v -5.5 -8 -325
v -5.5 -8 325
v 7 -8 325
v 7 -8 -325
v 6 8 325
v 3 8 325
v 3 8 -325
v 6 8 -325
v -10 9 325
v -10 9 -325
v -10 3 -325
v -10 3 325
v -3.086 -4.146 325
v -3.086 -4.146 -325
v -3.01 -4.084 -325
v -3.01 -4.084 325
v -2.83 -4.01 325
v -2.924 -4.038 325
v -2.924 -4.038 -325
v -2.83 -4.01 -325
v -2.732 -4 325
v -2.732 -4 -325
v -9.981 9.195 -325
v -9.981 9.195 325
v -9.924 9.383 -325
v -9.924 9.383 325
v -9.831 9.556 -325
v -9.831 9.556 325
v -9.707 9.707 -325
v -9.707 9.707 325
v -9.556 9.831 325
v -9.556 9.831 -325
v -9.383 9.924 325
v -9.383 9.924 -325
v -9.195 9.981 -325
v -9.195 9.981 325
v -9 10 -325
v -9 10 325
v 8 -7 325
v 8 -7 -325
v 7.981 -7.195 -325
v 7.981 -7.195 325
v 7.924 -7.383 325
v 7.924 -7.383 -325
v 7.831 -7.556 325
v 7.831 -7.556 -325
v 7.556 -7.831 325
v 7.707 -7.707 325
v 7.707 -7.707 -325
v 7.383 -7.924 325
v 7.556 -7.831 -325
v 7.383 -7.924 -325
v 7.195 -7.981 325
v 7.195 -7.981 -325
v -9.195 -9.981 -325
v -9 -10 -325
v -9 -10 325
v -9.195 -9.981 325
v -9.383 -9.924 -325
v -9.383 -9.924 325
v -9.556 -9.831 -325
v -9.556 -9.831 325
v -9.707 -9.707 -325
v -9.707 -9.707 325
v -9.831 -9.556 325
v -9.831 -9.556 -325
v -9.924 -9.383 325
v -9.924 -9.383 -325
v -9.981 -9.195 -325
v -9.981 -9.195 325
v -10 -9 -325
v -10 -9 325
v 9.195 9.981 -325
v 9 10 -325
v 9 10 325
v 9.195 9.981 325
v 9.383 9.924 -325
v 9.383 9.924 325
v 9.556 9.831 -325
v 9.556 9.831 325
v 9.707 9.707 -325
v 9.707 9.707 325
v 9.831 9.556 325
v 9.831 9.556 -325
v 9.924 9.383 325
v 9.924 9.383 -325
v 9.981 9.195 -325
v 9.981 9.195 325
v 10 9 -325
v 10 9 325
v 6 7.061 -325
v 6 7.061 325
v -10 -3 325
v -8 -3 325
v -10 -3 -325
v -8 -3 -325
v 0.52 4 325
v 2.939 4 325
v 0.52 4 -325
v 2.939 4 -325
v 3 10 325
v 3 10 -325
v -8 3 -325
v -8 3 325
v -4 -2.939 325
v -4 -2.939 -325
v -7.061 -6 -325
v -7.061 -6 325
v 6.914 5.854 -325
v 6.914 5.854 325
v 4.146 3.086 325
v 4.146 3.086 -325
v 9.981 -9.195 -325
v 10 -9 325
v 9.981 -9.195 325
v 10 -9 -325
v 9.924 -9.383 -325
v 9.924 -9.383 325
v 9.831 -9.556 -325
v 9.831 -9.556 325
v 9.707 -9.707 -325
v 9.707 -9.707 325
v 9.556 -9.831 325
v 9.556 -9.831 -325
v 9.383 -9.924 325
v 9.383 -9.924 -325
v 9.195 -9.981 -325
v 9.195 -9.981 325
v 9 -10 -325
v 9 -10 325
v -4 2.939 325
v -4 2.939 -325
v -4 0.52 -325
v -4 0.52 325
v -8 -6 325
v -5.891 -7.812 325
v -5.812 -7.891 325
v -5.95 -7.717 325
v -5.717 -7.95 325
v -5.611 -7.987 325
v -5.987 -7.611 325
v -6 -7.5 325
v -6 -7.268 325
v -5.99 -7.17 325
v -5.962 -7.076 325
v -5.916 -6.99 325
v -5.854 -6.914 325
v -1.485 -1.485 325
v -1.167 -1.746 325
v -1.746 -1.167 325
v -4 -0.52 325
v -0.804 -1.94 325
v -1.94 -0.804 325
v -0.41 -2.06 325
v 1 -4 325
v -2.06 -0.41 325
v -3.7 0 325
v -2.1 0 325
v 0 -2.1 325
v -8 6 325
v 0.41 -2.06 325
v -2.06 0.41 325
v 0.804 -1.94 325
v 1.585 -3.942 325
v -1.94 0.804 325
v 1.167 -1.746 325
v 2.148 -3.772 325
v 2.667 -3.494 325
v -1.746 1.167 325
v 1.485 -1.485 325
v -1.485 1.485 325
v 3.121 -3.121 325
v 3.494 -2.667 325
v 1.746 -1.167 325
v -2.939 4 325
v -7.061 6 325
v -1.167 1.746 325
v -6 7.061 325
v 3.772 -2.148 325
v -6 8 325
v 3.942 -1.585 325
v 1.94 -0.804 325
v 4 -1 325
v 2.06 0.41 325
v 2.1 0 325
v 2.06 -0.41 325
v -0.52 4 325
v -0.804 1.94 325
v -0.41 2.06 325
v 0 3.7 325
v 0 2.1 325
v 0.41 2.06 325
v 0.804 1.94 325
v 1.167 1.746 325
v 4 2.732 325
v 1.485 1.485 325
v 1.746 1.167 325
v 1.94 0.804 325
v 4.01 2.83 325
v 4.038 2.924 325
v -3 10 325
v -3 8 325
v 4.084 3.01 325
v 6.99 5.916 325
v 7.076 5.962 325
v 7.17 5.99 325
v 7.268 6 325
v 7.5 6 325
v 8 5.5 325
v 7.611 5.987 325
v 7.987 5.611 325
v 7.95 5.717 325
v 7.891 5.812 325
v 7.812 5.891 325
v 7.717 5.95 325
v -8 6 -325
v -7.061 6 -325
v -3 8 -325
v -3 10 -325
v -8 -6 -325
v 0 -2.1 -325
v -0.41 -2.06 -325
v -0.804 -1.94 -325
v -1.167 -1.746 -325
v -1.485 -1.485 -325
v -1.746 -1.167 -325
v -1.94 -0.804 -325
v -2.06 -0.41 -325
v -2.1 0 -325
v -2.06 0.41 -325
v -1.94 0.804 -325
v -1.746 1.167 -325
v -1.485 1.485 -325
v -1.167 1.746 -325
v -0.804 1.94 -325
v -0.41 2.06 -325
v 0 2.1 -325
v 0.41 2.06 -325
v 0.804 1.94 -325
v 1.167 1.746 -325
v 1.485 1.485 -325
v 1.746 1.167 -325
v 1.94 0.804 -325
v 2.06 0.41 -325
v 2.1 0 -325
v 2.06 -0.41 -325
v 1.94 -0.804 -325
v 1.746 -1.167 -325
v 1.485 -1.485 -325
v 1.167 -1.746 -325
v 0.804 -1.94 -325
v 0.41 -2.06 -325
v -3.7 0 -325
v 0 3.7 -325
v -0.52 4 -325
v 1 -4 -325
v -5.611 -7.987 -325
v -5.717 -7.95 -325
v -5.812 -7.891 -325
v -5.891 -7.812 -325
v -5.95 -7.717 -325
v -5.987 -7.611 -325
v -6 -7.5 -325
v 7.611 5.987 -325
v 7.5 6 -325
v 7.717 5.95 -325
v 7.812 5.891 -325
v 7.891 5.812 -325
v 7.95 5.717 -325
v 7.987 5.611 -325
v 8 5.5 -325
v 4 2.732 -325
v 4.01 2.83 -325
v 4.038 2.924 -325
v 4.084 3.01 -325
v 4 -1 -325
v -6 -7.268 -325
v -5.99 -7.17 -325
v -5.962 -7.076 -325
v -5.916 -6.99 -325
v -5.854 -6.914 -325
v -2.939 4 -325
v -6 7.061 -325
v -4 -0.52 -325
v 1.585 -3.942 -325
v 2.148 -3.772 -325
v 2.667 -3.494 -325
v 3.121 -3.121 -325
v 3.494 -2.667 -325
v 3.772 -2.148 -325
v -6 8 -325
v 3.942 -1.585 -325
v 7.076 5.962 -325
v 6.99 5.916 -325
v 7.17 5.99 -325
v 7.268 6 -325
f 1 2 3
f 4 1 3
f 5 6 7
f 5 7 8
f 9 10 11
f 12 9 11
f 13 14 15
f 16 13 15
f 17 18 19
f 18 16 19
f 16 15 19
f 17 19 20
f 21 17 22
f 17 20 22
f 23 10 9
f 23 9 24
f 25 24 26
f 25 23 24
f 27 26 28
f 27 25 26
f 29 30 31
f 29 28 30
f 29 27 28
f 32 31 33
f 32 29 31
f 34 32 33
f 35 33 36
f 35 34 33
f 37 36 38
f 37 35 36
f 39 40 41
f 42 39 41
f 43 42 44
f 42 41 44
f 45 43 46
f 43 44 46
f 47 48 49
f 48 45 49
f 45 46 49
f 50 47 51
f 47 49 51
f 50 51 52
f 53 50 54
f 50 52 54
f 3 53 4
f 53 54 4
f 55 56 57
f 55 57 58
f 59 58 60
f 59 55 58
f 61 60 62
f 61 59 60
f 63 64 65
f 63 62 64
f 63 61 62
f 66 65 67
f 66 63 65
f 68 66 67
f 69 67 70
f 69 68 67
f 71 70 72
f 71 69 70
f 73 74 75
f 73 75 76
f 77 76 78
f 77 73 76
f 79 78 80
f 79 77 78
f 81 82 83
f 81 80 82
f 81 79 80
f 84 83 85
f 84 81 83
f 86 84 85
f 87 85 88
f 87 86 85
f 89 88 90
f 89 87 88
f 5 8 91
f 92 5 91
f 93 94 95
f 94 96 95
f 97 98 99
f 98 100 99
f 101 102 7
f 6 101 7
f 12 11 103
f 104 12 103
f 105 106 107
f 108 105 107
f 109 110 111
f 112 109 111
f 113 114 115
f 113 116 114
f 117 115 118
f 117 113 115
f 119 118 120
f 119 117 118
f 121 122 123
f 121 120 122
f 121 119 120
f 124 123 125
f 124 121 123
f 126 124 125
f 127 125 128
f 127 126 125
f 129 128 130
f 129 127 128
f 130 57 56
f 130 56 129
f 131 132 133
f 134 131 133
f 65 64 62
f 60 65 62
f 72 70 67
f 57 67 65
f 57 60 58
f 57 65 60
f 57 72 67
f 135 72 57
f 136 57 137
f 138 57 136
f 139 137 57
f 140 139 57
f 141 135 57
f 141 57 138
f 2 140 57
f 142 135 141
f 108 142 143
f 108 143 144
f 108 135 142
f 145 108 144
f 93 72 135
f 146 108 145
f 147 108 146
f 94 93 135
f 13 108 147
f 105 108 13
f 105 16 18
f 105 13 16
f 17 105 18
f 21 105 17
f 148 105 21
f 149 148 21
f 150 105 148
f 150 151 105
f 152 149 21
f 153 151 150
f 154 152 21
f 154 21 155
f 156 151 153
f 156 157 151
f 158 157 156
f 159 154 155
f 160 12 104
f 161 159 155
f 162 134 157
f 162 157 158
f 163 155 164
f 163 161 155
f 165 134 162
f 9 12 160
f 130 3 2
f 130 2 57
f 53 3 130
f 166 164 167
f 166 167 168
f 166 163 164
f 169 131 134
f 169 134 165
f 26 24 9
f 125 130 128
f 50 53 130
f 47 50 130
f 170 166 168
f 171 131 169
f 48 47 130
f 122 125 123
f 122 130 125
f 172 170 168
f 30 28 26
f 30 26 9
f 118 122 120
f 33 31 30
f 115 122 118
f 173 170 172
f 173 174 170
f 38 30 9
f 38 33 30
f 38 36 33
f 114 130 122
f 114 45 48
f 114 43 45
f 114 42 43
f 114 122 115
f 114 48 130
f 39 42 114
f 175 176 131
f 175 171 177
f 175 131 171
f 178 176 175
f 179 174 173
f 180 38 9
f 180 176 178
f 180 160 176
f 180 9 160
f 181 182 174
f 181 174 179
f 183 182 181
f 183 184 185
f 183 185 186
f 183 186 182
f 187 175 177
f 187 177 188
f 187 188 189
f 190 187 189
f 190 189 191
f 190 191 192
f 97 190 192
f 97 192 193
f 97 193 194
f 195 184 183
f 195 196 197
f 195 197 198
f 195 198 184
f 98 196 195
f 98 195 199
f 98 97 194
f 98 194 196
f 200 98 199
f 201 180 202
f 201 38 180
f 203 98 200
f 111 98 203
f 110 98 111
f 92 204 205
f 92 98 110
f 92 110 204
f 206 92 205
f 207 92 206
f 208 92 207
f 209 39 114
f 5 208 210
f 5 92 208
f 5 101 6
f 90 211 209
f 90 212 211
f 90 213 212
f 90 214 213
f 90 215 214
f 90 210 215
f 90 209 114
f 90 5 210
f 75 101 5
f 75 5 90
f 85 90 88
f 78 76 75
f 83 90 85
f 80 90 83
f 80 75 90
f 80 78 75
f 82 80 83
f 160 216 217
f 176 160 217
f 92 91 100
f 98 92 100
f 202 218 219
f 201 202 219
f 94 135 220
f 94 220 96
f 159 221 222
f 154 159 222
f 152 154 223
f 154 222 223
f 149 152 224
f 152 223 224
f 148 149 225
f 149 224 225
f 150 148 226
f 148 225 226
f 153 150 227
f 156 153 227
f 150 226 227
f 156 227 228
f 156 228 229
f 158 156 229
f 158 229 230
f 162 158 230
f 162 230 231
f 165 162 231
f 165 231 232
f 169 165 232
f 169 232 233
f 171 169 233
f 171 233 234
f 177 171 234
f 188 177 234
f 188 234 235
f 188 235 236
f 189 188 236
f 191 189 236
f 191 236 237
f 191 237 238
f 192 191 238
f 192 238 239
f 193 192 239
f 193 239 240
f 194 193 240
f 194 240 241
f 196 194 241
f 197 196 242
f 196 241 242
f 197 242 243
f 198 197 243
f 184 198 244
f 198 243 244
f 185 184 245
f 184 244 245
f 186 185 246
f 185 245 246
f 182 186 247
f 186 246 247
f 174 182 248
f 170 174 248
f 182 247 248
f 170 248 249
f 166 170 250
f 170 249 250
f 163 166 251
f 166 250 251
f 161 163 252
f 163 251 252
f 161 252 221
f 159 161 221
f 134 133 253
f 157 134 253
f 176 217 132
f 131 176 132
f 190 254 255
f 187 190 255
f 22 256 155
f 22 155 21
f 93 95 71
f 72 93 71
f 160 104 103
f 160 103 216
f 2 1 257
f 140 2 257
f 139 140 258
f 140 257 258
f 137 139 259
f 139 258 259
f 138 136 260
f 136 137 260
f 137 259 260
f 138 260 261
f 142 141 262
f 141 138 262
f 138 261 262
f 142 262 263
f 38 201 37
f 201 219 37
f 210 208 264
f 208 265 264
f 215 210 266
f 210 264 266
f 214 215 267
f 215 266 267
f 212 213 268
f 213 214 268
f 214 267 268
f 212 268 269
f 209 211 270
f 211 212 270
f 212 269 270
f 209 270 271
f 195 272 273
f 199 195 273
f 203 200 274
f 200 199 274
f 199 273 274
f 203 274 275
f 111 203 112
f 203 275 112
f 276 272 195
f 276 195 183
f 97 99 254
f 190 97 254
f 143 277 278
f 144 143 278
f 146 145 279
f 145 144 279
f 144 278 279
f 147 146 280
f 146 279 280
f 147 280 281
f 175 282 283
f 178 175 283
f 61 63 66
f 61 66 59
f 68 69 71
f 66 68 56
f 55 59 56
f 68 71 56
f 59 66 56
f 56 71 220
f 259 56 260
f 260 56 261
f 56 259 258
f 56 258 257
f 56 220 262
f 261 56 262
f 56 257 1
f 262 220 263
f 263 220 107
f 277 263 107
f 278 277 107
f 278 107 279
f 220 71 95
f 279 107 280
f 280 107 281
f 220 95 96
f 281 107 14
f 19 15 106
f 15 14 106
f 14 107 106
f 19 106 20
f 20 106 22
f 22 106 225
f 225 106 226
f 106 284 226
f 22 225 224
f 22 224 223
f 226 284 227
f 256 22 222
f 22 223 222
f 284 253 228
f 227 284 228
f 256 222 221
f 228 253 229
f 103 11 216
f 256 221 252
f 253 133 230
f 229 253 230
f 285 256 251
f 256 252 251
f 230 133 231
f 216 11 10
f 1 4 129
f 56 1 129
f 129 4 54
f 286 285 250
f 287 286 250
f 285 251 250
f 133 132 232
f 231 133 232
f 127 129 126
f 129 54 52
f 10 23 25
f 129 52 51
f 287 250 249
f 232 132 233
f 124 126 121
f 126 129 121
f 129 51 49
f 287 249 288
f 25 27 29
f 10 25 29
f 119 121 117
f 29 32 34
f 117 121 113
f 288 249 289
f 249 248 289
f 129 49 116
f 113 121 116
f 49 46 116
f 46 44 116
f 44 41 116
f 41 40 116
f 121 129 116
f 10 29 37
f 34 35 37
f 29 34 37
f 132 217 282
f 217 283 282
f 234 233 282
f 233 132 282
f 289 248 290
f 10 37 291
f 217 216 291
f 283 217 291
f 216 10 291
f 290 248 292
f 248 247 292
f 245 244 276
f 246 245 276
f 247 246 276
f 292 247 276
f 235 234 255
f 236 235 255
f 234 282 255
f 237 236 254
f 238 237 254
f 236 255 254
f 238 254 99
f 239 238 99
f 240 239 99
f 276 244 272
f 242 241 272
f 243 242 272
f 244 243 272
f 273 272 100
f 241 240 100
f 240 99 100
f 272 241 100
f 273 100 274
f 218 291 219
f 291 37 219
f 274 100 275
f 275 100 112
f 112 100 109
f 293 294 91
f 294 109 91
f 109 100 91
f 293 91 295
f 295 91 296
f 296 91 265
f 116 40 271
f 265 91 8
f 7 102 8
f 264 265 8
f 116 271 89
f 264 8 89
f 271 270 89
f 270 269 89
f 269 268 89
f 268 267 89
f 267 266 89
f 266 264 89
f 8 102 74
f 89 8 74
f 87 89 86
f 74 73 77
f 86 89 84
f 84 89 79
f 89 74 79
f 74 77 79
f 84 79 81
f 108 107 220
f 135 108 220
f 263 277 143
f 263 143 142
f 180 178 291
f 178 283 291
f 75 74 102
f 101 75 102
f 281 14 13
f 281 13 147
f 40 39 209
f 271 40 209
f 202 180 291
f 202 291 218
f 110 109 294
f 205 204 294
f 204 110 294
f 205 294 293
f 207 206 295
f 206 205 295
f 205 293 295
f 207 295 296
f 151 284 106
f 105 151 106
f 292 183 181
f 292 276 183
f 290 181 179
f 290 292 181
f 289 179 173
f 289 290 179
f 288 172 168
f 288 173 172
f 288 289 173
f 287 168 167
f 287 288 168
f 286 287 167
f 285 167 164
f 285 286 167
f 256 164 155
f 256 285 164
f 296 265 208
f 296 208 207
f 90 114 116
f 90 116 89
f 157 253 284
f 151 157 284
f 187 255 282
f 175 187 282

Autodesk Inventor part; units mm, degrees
sketch "Sketch_64" plane through (0, 0, 0) normal (0, 0, 1) x (1, 0, 0)
  line L0 (-10, -3) -> (-10, -9)
  arc A0 (-10, -9) -> (-9, -10) centre (-9, -9) ccw
  line L1 (-9, -10) -> (9, -10)
  arc A1 (9, -10) -> (10, -9) centre (9, -9) ccw
  line L2 (10, -9) -> (10, 9)
  arc A2 (10, 9) -> (9, 10) centre (9, 9) ccw
  line L3 (9, 10) -> (3, 10)
  line L4 (3, 10) -> (3, 8)
  line L5 (3, 8) -> (6, 8)
  line L6 (6, 8) -> (6, 7.0607)
  line L7 (6, 7.0607) -> (2.9393, 4)
  line L8 (2.9393, 4) -> (0.5196, 4)
  line L9 (0.5196, 4) -> (0, 3.7)
  line L10 (0, 3.7) -> (-0.5196, 4)
  line L11 (-0.5196, 4) -> (-2.9393, 4)
  line L12 (-2.9393, 4) -> (-6, 7.0607)
  line L13 (-6, 7.0607) -> (-6, 8)
  line L14 (-6, 8) -> (-3, 8)
  line L15 (-3, 8) -> (-3, 10)
  line L16 (-3, 10) -> (-9, 10)
  arc A3 (-9, 10) -> (-10, 9) centre (-9, 9) ccw
  line L17 (-10, 9) -> (-10, 3)
  line L18 (-10, 3) -> (-8, 3)
  line L19 (-8, 3) -> (-8, 6)
  line L20 (-8, 6) -> (-7.0607, 6)
  line L21 (-7.0607, 6) -> (-4, 2.9393)
  line L22 (-4, 2.9393) -> (-4, 0.5196)
  line L23 (-4, 0.5196) -> (-3.7, 0)
  line L24 (-3.7, 0) -> (-4, -0.5196)
  line L25 (-4, -0.5196) -> (-4, -2.9393)
  line L26 (-4, -2.9393) -> (-7.0607, -6)
  line L27 (-7.0607, -6) -> (-8, -6)
  line L28 (-8, -6) -> (-8, -3)
  line L29 (-8, -3) -> (-10, -3)
  line L30 (-6, -7.2678) -> (-6, -7.5)
  arc A4 (-6, -7.5) -> (-5.5, -8) centre (-5.5, -7.5) ccw
  line L31 (-5.5, -8) -> (7, -8)
  arc A5 (7, -8) -> (8, -7) centre (7, -7) ccw
  line L32 (8, -7) -> (8, 5.5)
  arc A6 (8, 5.5) -> (7.5, 6) centre (7.5, 5.5) ccw
  line L33 (7.5, 6) -> (7.2678, 6)
  arc A7 (7.2678, 6) -> (6.9142, 5.8536) centre (7.2678, 5.5) ccw
  line L34 (6.9142, 5.8536) -> (4.1464, 3.0858)
  arc A8 (4.1464, 3.0858) -> (4, 2.7322) centre (4.5, 2.7322) ccw
  line L35 (4, 2.7322) -> (4, -1)
  arc A9 (1, -4) -> (4, -1) centre (1, -1) ccw
  line L36 (1, -4) -> (-2.7322, -4)
  arc A10 (-2.7322, -4) -> (-3.0858, -4.1464) centre (-2.7322, -4.5) ccw
  line L37 (-3.0858, -4.1464) -> (-5.8536, -6.9142)
  arc A11 (-5.8536, -6.9142) -> (-6, -7.2678) centre (-5.5, -7.2678) ccw
extrude "Extrusion1" add sketch "Sketch_64" along normal mid plane 650
sketch "Sketch2" plane through (0, 0, 325) normal (0, 0, 1) x (-1, 0, 0)
  point P0 (0, 0)
hole "Hole1" at (0, 0, 325) direction (0, 0, -1) diameter 4.2 end through all both
ref_plane "C1_XY" through (0, 0, 0) normal (0, 0, 1) x (1, 0, 0)
ref_plane "C1_YZ" through (0, 0, 0) normal (1, 0, 0) x (0, 1, 0)
ref_plane "C1_ZX" through (0, 0, 0) normal (0, 1, 0) x (0, 0, 1)
thread "Thread1" size "M5x0.8" class "6H" standard "ANSI Metric M Profile" length 10
thread "Thread2" size "M5x0.8" class "6H" standard "ANSI Metric M Profile" length 10
properties part number "HFSTB5-2020-680" material "Aluminum 6061"
